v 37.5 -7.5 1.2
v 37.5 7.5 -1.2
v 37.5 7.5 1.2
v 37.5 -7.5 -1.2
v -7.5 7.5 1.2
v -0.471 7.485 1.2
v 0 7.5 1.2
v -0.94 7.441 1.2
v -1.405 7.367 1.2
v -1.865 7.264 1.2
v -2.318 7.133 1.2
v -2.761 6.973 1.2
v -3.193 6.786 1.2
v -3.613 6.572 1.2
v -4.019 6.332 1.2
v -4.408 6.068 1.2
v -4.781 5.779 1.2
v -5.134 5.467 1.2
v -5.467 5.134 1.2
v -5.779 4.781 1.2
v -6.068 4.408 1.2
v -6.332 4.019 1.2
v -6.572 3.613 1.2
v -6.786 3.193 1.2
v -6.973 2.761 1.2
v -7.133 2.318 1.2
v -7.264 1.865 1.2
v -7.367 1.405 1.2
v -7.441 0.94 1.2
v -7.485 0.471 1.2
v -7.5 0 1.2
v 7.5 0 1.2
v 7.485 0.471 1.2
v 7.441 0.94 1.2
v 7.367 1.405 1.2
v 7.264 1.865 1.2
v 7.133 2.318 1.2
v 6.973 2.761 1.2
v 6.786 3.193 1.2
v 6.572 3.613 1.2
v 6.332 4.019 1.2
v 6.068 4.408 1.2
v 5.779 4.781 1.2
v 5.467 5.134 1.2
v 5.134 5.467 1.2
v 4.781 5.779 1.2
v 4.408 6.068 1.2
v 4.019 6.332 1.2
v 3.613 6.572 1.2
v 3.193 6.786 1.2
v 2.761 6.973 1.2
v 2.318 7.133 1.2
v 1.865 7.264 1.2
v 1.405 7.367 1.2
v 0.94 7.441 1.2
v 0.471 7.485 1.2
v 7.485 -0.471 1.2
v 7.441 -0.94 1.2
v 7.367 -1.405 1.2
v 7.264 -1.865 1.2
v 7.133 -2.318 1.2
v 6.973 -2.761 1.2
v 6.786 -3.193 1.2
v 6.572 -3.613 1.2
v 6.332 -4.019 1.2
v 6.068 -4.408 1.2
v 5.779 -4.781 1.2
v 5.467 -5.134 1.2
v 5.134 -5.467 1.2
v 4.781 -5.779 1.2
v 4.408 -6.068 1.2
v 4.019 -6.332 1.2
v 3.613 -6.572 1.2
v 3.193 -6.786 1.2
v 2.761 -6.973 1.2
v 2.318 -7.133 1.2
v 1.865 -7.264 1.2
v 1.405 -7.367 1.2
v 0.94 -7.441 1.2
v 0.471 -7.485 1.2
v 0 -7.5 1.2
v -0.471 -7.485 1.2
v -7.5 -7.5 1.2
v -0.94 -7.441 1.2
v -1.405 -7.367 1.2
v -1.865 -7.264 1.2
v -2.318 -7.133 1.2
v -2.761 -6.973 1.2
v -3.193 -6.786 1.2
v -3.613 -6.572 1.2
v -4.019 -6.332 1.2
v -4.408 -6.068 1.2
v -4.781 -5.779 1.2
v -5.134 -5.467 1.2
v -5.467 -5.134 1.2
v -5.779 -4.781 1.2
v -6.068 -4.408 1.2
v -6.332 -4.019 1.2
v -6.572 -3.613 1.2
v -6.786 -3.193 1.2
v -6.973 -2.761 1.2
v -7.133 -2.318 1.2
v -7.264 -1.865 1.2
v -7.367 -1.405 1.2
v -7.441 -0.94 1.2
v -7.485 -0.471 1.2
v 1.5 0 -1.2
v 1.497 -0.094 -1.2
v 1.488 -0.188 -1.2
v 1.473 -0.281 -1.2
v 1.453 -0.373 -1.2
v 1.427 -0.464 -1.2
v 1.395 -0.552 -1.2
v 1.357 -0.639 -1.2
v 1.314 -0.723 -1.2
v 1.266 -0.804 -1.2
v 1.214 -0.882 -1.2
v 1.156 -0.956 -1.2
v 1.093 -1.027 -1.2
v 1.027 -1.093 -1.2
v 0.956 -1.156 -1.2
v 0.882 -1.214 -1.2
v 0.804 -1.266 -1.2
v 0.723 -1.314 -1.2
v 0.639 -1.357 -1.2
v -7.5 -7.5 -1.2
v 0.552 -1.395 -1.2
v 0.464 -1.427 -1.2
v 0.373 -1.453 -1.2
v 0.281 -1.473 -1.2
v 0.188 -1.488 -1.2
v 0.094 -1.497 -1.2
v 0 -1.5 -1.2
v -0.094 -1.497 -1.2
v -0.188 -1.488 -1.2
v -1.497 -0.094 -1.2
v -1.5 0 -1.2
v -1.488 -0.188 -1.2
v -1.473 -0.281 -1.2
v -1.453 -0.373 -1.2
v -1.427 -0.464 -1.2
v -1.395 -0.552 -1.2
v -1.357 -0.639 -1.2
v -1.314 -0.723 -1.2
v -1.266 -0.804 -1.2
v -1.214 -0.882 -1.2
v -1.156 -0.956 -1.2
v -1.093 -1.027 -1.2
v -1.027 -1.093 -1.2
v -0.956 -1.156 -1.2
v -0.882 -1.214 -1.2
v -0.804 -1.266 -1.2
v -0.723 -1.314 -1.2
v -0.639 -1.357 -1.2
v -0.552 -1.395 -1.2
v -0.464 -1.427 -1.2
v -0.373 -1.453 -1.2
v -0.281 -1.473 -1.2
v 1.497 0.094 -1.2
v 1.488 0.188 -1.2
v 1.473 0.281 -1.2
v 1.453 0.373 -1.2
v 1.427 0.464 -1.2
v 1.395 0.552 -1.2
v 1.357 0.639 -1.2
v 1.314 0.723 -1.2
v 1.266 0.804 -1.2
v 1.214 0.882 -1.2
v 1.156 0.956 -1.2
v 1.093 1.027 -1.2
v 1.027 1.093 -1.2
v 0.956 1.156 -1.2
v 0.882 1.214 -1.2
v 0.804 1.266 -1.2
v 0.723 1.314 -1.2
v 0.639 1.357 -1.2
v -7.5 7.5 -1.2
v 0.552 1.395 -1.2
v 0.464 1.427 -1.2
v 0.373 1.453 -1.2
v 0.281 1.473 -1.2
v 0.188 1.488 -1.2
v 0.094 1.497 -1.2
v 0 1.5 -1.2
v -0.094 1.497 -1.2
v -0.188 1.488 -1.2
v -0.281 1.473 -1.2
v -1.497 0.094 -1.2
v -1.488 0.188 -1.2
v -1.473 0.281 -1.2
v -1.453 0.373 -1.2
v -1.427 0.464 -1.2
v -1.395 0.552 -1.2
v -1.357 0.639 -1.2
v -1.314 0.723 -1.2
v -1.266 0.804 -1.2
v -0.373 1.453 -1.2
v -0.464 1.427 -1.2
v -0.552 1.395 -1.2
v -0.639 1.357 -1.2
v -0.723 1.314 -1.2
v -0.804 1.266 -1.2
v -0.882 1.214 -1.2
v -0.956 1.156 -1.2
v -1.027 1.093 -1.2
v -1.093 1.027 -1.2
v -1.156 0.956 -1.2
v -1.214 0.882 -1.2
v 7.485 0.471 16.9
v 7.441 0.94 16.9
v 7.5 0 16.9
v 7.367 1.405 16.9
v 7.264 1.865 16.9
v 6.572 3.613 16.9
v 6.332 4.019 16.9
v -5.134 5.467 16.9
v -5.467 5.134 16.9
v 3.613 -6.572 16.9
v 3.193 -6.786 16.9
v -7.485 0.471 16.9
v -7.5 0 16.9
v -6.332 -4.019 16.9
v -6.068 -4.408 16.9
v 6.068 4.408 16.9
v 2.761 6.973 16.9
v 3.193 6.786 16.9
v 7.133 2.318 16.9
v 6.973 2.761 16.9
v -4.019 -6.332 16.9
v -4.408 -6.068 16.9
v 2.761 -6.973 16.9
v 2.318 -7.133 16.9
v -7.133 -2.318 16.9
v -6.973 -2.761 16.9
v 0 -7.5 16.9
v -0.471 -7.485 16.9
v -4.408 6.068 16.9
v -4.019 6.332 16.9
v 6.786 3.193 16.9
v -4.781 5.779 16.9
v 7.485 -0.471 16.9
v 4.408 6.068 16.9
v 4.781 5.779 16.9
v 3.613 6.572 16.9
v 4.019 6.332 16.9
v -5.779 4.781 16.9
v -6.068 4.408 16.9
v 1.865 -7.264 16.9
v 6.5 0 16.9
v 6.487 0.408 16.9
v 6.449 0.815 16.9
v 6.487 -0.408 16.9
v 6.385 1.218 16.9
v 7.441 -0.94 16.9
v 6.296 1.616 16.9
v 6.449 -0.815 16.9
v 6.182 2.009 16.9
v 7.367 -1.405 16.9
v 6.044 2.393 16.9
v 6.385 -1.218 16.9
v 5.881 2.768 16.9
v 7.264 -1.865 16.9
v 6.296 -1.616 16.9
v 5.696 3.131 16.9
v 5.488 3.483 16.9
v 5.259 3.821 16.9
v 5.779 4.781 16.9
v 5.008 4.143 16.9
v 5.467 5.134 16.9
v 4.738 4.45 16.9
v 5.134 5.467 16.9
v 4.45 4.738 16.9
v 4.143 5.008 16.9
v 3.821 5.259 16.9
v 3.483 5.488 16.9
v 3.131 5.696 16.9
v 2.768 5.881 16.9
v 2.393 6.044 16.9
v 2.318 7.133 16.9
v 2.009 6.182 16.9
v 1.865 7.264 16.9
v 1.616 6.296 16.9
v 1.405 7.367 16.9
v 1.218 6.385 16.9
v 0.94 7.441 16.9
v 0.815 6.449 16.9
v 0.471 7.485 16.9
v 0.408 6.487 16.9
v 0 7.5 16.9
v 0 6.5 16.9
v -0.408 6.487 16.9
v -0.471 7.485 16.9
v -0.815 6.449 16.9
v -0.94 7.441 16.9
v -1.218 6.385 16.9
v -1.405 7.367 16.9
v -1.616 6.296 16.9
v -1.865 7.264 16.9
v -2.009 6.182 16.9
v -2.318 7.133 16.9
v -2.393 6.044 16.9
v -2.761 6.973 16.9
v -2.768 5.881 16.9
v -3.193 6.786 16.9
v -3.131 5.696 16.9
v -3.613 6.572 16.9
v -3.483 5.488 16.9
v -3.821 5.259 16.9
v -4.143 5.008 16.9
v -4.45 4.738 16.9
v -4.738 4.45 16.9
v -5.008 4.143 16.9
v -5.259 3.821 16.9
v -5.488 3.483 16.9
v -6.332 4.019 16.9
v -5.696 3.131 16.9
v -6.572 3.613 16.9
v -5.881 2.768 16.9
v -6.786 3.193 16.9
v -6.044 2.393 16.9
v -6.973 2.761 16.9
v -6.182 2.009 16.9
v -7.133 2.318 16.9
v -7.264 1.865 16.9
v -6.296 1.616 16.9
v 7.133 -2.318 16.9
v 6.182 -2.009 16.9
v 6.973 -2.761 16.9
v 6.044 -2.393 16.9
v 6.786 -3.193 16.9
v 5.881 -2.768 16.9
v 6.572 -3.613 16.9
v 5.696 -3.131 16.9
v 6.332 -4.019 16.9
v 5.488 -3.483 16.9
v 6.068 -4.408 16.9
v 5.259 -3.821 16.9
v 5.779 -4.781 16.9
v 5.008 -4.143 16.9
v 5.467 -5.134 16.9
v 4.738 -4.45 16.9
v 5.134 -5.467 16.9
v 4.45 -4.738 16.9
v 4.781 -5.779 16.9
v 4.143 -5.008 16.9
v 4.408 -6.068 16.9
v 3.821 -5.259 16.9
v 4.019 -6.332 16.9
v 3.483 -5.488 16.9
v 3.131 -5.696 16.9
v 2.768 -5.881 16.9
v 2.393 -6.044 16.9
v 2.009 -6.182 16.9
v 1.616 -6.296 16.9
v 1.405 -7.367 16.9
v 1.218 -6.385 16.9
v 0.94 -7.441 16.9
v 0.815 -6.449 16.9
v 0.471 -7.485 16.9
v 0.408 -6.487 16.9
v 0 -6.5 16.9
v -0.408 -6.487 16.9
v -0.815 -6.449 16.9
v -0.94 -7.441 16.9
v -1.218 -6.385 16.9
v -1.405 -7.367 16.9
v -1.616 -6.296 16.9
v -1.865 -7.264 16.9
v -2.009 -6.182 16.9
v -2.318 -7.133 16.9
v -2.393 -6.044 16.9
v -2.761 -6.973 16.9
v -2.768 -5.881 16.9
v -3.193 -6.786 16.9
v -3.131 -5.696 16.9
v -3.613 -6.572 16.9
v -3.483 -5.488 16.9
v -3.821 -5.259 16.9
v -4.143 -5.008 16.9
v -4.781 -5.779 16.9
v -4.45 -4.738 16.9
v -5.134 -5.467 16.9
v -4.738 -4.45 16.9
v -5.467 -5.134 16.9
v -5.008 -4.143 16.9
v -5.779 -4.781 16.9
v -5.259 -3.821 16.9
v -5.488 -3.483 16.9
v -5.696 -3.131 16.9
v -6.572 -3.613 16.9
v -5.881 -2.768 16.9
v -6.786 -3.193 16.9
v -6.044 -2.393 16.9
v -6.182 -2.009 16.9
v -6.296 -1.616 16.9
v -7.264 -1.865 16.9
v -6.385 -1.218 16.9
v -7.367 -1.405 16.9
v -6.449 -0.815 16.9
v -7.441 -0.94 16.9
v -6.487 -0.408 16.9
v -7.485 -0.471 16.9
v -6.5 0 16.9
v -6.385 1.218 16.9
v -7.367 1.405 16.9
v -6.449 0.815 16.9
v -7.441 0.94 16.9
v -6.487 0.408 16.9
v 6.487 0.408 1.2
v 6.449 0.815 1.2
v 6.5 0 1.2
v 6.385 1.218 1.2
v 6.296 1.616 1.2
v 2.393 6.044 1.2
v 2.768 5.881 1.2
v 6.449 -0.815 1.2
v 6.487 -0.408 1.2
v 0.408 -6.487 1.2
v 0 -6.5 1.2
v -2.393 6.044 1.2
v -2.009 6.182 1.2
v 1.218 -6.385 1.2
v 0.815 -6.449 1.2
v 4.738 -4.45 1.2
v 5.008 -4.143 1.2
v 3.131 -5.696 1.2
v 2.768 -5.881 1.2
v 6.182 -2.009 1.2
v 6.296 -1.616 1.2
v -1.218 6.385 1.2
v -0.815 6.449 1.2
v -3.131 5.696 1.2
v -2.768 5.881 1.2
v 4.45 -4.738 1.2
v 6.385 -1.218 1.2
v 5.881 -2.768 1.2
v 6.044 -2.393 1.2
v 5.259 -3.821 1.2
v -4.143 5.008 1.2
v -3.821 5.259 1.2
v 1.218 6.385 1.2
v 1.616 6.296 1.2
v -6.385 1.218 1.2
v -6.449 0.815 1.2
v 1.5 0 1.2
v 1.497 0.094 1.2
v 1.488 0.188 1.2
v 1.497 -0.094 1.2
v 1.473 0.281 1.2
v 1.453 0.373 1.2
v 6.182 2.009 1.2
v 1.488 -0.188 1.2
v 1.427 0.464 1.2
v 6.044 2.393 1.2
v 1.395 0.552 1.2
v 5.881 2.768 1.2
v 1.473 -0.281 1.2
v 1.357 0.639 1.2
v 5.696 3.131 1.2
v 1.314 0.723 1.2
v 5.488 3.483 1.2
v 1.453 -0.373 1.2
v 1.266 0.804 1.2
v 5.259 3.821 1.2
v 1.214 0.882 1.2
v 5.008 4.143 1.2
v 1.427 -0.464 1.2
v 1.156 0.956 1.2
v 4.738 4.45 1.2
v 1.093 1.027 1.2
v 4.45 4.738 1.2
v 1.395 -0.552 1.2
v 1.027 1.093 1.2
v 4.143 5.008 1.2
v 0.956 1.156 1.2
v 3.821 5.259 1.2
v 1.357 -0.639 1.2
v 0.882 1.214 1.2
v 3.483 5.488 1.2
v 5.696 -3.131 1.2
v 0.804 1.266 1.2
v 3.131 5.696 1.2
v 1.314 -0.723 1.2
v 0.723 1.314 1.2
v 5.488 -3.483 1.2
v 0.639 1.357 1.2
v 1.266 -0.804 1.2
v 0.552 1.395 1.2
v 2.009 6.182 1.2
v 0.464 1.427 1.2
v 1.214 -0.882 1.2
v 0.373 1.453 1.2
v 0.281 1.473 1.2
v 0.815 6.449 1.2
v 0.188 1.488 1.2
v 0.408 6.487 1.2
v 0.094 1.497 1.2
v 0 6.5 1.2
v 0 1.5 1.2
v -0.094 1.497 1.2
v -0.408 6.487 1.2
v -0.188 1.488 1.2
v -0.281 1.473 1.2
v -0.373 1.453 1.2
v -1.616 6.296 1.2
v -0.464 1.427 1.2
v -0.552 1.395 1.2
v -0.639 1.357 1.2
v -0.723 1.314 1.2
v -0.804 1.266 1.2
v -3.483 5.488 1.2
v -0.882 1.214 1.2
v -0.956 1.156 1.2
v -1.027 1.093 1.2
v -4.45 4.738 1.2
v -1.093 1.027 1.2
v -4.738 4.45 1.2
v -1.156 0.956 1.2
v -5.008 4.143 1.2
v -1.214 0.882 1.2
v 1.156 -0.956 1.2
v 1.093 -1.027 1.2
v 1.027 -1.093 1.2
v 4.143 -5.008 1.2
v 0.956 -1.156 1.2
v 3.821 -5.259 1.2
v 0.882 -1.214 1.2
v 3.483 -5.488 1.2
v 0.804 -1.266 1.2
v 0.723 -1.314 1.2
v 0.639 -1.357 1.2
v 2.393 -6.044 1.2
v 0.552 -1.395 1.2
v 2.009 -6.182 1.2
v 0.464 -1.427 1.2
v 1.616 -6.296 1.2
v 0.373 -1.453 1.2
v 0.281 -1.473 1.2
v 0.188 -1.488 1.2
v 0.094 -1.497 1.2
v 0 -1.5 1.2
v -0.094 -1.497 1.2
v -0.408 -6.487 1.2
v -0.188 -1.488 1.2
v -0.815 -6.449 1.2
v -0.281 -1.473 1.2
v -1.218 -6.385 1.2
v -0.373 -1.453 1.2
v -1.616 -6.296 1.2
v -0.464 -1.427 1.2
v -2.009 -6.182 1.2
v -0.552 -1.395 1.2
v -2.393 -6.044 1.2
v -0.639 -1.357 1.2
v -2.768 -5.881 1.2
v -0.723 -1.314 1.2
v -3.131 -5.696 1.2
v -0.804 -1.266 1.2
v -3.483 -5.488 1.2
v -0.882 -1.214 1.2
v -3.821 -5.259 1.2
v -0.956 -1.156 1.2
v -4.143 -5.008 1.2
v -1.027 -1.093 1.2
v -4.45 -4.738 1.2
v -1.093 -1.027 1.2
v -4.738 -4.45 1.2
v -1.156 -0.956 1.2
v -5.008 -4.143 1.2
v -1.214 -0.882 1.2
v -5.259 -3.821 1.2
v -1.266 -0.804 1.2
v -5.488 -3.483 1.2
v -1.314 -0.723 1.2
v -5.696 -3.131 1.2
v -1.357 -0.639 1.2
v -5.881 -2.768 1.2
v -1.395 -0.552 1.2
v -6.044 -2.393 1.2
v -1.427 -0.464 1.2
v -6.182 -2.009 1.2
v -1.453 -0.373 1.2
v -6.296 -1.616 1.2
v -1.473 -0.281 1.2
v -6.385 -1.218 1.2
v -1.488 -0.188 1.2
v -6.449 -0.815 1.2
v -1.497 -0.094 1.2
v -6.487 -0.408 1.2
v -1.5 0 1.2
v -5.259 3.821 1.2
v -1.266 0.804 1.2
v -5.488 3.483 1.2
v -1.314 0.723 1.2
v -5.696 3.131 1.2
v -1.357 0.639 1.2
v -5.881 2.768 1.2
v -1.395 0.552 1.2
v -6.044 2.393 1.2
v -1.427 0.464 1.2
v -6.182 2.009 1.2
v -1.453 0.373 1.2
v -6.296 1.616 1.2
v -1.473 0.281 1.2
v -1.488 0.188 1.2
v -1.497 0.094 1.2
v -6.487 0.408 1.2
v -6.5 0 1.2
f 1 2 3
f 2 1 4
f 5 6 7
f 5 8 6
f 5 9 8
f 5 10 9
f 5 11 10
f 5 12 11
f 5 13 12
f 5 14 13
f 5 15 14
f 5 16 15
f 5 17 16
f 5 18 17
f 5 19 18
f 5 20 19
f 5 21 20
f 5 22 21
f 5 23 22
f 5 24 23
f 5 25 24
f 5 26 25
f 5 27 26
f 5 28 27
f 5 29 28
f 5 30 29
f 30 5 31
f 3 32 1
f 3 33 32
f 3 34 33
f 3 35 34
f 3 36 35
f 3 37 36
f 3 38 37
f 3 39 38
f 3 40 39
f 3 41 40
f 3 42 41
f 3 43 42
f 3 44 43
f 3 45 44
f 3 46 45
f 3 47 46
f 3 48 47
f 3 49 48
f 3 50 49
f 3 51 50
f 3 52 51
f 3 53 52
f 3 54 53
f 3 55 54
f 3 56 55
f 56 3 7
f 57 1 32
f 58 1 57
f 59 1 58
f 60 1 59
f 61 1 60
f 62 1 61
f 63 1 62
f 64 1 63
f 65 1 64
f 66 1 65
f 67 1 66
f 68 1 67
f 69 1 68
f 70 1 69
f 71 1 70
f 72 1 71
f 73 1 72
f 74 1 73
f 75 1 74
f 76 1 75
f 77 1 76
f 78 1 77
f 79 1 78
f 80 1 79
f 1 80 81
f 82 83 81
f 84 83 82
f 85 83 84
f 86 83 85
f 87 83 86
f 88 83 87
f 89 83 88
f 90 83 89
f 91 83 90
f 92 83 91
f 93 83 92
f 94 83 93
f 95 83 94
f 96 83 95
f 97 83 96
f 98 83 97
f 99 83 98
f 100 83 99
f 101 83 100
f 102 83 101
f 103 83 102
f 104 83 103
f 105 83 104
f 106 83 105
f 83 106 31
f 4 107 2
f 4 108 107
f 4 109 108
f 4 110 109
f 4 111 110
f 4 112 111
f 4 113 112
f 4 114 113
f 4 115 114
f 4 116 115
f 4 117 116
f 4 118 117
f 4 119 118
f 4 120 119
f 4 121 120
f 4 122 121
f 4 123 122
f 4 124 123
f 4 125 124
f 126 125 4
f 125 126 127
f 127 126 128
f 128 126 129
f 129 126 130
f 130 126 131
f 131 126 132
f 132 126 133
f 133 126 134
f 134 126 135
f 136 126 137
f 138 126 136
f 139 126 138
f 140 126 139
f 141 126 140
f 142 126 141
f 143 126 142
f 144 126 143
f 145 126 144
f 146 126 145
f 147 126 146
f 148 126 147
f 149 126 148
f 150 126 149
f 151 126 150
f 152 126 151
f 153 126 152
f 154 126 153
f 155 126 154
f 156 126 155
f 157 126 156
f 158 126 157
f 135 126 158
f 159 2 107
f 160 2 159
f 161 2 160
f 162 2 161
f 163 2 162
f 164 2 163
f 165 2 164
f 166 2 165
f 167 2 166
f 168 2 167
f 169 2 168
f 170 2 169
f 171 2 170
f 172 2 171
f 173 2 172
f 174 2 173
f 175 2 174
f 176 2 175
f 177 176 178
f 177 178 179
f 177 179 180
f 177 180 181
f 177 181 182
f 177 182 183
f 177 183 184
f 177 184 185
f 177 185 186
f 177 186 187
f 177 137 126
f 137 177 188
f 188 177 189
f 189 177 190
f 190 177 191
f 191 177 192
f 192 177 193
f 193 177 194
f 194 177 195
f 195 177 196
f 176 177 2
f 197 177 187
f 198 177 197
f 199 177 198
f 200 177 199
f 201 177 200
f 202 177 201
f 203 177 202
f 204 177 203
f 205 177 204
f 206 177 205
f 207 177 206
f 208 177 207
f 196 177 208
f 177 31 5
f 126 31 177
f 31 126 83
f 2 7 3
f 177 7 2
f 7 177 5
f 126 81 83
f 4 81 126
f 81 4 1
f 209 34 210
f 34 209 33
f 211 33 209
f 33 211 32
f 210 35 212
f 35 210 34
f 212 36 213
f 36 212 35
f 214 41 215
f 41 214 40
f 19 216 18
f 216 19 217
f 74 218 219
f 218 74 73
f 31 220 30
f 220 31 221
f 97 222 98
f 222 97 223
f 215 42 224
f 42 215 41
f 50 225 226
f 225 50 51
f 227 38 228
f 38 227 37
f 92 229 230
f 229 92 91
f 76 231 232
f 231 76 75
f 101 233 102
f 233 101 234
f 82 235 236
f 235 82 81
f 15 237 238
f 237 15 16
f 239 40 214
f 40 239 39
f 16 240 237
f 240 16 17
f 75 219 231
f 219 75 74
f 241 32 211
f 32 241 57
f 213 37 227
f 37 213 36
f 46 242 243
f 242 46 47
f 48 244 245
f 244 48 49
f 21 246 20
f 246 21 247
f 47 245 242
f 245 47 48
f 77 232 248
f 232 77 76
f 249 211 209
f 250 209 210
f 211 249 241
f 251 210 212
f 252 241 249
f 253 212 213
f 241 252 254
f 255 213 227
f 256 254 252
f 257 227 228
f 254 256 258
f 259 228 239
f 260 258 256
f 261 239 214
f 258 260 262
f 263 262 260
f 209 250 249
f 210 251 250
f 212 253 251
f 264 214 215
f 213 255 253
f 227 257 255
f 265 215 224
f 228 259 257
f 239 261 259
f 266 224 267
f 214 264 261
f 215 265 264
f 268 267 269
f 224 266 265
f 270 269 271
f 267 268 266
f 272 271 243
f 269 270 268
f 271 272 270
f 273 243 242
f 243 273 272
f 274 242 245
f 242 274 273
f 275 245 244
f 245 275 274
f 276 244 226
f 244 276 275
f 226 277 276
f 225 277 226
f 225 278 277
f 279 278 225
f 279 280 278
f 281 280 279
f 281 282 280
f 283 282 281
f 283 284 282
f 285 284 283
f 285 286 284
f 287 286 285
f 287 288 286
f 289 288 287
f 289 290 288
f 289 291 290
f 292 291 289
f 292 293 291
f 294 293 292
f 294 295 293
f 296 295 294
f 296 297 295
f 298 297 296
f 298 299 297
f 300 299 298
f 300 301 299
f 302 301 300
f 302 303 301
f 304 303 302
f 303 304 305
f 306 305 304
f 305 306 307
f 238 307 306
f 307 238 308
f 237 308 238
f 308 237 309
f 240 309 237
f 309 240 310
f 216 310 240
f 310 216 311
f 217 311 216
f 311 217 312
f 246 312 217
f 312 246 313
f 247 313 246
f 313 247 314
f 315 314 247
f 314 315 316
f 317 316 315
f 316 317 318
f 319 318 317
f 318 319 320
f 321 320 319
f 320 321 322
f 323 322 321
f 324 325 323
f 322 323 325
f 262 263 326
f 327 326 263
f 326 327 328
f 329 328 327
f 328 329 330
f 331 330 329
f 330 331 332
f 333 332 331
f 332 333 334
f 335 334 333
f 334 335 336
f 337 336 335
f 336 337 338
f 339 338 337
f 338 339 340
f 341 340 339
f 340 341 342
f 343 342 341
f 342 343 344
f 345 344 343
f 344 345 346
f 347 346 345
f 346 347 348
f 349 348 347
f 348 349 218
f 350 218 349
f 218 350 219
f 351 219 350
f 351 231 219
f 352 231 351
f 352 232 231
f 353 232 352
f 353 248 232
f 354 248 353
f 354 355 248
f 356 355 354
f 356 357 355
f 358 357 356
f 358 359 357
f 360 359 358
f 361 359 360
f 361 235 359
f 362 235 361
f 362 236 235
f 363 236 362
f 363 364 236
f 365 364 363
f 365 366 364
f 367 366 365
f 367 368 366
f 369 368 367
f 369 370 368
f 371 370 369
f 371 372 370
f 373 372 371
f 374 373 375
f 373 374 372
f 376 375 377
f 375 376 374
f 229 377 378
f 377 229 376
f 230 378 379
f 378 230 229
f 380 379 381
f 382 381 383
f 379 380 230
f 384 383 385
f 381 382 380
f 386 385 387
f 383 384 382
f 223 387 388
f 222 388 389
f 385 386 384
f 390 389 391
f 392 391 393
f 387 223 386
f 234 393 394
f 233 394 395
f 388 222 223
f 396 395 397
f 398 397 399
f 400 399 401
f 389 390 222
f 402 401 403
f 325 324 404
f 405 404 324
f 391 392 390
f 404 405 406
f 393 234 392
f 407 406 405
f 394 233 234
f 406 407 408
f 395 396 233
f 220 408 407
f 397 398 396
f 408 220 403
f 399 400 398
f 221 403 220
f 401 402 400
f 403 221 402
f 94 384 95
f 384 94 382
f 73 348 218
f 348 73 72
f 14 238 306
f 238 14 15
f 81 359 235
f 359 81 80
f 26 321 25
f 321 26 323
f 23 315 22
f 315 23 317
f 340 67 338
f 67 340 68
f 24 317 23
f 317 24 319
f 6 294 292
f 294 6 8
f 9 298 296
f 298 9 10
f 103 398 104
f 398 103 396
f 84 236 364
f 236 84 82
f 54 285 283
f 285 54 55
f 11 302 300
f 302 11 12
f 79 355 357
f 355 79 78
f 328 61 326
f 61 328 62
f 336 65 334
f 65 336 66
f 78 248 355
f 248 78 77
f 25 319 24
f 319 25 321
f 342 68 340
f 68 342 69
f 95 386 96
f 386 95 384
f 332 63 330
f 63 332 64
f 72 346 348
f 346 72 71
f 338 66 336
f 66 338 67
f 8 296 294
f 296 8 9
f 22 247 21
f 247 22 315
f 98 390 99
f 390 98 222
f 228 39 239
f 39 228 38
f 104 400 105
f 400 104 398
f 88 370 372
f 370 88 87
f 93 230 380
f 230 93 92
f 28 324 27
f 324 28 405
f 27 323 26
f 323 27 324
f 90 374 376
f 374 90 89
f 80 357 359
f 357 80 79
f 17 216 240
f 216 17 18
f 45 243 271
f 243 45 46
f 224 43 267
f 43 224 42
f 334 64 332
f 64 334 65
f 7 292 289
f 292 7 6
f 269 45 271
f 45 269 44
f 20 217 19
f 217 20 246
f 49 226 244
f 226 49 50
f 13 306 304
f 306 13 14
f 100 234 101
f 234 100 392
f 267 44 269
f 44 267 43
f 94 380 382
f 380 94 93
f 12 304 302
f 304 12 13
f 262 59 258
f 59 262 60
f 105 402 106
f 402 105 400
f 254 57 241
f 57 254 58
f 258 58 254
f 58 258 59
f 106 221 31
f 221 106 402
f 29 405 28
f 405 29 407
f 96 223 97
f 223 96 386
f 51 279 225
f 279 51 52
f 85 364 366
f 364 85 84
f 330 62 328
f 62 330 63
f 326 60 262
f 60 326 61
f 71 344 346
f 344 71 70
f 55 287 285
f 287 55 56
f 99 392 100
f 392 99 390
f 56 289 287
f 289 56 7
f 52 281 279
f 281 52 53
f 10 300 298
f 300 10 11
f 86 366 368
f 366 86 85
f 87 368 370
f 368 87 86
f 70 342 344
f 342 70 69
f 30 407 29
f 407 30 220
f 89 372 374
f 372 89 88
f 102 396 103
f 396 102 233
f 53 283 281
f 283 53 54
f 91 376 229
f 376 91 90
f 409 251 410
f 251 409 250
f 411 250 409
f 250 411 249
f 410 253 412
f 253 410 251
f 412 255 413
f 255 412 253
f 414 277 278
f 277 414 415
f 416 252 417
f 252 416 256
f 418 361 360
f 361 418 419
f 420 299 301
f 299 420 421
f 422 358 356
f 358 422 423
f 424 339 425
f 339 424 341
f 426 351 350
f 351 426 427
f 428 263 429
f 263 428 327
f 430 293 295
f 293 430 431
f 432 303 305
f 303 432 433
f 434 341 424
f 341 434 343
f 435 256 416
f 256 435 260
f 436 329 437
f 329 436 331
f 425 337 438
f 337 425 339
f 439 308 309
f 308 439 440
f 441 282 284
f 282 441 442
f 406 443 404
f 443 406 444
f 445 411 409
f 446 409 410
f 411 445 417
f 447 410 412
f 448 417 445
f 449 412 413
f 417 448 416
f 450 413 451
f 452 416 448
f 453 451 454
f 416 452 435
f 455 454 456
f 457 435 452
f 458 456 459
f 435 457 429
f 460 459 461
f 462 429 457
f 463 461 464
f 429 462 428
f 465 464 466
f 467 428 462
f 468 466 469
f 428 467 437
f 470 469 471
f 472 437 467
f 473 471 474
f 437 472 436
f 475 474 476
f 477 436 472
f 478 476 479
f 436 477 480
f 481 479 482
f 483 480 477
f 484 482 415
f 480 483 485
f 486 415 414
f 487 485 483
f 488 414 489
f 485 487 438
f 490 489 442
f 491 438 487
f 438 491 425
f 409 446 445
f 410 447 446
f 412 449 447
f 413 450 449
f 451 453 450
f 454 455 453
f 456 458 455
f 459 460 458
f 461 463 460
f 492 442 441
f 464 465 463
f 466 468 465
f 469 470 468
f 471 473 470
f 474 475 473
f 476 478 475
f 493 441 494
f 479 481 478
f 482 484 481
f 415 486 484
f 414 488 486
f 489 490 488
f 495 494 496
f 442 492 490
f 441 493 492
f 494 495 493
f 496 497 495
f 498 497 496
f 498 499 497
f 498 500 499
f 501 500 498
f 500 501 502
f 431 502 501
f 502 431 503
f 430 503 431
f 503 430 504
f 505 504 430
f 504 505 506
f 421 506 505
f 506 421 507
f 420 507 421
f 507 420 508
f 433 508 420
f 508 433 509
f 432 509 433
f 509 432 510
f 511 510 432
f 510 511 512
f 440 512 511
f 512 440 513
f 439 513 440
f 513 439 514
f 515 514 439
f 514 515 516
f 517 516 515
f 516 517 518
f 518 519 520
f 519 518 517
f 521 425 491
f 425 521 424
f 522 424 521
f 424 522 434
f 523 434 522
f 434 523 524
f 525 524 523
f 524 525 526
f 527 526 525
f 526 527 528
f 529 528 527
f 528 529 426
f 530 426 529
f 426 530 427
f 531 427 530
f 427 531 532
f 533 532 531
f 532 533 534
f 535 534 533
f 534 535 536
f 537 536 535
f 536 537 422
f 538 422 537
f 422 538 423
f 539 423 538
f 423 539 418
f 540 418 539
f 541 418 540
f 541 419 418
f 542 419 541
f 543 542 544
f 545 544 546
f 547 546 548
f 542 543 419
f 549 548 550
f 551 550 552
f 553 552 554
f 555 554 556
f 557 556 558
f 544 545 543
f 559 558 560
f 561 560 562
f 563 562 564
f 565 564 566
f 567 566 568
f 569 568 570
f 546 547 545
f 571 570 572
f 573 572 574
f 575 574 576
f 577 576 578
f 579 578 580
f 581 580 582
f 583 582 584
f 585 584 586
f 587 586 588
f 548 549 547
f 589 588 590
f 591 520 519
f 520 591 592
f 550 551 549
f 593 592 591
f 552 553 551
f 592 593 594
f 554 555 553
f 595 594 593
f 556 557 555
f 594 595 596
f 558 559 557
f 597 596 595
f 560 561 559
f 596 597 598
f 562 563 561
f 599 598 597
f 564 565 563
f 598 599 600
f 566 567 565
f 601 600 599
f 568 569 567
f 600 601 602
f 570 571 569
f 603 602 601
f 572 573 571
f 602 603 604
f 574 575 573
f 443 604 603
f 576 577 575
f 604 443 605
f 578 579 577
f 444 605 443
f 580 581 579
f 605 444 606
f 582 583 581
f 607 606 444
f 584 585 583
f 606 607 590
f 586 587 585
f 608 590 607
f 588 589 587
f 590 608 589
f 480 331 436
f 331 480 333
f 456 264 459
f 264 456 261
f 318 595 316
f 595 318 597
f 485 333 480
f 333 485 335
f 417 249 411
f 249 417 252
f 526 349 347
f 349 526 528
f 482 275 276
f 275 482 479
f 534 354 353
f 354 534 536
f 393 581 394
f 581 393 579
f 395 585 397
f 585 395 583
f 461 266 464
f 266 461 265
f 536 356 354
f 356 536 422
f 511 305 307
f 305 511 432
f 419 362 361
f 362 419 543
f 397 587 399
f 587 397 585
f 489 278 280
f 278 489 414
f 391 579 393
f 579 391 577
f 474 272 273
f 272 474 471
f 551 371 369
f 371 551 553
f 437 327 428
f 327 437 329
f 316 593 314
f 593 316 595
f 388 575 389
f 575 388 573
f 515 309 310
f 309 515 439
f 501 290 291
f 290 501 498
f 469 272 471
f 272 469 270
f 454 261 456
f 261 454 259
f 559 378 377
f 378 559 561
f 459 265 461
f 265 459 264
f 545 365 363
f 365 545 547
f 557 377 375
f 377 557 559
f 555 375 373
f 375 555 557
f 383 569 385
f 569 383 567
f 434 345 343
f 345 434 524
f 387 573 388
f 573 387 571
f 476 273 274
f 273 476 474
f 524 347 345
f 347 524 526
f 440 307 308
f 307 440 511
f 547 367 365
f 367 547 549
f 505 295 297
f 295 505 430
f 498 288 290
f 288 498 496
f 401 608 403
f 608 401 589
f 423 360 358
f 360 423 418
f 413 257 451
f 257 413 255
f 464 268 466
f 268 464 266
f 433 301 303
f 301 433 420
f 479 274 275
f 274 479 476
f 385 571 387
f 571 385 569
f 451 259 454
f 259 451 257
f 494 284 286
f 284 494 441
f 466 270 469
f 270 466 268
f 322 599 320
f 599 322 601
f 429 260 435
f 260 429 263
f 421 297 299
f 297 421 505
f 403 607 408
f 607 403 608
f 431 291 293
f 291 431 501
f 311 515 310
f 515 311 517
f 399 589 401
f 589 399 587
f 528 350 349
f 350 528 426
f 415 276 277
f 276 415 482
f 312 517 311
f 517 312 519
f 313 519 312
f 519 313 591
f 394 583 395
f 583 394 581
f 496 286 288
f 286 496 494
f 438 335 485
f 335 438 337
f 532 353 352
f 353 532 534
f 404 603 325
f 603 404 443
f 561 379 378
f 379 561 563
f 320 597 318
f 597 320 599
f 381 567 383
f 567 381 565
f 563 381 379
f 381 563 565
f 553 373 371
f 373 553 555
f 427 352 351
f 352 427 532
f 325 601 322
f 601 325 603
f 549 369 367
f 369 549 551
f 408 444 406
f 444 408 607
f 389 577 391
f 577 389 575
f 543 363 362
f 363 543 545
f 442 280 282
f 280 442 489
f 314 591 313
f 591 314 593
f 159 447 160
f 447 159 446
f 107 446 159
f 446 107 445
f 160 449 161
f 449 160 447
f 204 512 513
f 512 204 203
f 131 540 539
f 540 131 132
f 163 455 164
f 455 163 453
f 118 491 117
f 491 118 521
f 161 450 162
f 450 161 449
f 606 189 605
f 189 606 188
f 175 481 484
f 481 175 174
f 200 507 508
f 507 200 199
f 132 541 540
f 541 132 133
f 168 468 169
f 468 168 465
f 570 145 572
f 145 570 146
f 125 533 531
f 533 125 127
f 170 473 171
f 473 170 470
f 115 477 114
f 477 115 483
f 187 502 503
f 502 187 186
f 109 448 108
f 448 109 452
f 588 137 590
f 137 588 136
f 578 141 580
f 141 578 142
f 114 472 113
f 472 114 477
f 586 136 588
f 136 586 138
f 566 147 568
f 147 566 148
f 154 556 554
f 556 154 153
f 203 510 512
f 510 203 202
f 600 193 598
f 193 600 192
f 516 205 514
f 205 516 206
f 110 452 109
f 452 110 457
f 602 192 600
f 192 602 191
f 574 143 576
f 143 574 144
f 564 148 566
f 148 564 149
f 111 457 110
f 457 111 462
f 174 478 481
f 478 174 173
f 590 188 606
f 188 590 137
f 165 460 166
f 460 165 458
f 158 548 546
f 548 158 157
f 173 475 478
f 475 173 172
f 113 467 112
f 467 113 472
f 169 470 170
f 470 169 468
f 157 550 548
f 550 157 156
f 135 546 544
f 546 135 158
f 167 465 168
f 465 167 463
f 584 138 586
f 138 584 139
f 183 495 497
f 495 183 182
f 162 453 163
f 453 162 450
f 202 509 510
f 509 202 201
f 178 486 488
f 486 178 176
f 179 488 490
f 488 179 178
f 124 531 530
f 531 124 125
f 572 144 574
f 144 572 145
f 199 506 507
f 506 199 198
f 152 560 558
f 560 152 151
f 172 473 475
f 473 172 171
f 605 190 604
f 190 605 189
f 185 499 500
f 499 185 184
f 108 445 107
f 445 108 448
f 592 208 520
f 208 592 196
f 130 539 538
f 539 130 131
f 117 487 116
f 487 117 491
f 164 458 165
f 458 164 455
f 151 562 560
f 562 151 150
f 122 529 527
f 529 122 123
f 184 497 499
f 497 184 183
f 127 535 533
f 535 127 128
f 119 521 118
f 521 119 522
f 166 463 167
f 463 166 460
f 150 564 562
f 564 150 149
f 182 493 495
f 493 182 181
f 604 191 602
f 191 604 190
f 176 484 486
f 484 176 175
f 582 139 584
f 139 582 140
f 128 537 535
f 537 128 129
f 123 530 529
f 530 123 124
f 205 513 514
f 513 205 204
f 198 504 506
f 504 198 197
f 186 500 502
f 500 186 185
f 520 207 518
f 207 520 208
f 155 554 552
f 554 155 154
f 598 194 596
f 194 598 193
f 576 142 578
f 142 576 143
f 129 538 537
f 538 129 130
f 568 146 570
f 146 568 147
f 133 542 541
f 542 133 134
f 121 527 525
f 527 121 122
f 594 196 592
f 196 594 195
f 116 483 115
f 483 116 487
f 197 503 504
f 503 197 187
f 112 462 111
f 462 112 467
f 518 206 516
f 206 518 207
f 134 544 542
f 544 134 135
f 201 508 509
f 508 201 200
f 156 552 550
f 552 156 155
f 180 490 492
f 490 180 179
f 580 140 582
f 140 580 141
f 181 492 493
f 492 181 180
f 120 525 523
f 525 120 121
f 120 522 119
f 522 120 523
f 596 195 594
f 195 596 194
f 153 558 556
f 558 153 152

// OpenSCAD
// Pinholes used for the hyperspectral scanner

y = 15;
r1 = y/2;
x = 37.5+r1;

z = 2.4;

h1 = 20.5-z*2;
r2 = (y/2-1);
r3 = 3/2; // The size of the pinhole, radius in mm

module plus () {
    translate ([x/2-r1,0,0]) {cube (([x, y, z]), center = true);}
    
    translate ([0,0,h1/2+z/2]) {cylinder (h1, r1, r1, $fn = 100, center = true);}

}

module minus (){
    translate ([0,0,h1/2+z/2]) {cylinder (h1, r2, r2, $fn = 100, center = true);}
    
    translate ([0,0,0]) {cylinder (z, r3, r3, $fn = 100, center = true); }
   
}

{difference(){ plus(); minus ();}}
